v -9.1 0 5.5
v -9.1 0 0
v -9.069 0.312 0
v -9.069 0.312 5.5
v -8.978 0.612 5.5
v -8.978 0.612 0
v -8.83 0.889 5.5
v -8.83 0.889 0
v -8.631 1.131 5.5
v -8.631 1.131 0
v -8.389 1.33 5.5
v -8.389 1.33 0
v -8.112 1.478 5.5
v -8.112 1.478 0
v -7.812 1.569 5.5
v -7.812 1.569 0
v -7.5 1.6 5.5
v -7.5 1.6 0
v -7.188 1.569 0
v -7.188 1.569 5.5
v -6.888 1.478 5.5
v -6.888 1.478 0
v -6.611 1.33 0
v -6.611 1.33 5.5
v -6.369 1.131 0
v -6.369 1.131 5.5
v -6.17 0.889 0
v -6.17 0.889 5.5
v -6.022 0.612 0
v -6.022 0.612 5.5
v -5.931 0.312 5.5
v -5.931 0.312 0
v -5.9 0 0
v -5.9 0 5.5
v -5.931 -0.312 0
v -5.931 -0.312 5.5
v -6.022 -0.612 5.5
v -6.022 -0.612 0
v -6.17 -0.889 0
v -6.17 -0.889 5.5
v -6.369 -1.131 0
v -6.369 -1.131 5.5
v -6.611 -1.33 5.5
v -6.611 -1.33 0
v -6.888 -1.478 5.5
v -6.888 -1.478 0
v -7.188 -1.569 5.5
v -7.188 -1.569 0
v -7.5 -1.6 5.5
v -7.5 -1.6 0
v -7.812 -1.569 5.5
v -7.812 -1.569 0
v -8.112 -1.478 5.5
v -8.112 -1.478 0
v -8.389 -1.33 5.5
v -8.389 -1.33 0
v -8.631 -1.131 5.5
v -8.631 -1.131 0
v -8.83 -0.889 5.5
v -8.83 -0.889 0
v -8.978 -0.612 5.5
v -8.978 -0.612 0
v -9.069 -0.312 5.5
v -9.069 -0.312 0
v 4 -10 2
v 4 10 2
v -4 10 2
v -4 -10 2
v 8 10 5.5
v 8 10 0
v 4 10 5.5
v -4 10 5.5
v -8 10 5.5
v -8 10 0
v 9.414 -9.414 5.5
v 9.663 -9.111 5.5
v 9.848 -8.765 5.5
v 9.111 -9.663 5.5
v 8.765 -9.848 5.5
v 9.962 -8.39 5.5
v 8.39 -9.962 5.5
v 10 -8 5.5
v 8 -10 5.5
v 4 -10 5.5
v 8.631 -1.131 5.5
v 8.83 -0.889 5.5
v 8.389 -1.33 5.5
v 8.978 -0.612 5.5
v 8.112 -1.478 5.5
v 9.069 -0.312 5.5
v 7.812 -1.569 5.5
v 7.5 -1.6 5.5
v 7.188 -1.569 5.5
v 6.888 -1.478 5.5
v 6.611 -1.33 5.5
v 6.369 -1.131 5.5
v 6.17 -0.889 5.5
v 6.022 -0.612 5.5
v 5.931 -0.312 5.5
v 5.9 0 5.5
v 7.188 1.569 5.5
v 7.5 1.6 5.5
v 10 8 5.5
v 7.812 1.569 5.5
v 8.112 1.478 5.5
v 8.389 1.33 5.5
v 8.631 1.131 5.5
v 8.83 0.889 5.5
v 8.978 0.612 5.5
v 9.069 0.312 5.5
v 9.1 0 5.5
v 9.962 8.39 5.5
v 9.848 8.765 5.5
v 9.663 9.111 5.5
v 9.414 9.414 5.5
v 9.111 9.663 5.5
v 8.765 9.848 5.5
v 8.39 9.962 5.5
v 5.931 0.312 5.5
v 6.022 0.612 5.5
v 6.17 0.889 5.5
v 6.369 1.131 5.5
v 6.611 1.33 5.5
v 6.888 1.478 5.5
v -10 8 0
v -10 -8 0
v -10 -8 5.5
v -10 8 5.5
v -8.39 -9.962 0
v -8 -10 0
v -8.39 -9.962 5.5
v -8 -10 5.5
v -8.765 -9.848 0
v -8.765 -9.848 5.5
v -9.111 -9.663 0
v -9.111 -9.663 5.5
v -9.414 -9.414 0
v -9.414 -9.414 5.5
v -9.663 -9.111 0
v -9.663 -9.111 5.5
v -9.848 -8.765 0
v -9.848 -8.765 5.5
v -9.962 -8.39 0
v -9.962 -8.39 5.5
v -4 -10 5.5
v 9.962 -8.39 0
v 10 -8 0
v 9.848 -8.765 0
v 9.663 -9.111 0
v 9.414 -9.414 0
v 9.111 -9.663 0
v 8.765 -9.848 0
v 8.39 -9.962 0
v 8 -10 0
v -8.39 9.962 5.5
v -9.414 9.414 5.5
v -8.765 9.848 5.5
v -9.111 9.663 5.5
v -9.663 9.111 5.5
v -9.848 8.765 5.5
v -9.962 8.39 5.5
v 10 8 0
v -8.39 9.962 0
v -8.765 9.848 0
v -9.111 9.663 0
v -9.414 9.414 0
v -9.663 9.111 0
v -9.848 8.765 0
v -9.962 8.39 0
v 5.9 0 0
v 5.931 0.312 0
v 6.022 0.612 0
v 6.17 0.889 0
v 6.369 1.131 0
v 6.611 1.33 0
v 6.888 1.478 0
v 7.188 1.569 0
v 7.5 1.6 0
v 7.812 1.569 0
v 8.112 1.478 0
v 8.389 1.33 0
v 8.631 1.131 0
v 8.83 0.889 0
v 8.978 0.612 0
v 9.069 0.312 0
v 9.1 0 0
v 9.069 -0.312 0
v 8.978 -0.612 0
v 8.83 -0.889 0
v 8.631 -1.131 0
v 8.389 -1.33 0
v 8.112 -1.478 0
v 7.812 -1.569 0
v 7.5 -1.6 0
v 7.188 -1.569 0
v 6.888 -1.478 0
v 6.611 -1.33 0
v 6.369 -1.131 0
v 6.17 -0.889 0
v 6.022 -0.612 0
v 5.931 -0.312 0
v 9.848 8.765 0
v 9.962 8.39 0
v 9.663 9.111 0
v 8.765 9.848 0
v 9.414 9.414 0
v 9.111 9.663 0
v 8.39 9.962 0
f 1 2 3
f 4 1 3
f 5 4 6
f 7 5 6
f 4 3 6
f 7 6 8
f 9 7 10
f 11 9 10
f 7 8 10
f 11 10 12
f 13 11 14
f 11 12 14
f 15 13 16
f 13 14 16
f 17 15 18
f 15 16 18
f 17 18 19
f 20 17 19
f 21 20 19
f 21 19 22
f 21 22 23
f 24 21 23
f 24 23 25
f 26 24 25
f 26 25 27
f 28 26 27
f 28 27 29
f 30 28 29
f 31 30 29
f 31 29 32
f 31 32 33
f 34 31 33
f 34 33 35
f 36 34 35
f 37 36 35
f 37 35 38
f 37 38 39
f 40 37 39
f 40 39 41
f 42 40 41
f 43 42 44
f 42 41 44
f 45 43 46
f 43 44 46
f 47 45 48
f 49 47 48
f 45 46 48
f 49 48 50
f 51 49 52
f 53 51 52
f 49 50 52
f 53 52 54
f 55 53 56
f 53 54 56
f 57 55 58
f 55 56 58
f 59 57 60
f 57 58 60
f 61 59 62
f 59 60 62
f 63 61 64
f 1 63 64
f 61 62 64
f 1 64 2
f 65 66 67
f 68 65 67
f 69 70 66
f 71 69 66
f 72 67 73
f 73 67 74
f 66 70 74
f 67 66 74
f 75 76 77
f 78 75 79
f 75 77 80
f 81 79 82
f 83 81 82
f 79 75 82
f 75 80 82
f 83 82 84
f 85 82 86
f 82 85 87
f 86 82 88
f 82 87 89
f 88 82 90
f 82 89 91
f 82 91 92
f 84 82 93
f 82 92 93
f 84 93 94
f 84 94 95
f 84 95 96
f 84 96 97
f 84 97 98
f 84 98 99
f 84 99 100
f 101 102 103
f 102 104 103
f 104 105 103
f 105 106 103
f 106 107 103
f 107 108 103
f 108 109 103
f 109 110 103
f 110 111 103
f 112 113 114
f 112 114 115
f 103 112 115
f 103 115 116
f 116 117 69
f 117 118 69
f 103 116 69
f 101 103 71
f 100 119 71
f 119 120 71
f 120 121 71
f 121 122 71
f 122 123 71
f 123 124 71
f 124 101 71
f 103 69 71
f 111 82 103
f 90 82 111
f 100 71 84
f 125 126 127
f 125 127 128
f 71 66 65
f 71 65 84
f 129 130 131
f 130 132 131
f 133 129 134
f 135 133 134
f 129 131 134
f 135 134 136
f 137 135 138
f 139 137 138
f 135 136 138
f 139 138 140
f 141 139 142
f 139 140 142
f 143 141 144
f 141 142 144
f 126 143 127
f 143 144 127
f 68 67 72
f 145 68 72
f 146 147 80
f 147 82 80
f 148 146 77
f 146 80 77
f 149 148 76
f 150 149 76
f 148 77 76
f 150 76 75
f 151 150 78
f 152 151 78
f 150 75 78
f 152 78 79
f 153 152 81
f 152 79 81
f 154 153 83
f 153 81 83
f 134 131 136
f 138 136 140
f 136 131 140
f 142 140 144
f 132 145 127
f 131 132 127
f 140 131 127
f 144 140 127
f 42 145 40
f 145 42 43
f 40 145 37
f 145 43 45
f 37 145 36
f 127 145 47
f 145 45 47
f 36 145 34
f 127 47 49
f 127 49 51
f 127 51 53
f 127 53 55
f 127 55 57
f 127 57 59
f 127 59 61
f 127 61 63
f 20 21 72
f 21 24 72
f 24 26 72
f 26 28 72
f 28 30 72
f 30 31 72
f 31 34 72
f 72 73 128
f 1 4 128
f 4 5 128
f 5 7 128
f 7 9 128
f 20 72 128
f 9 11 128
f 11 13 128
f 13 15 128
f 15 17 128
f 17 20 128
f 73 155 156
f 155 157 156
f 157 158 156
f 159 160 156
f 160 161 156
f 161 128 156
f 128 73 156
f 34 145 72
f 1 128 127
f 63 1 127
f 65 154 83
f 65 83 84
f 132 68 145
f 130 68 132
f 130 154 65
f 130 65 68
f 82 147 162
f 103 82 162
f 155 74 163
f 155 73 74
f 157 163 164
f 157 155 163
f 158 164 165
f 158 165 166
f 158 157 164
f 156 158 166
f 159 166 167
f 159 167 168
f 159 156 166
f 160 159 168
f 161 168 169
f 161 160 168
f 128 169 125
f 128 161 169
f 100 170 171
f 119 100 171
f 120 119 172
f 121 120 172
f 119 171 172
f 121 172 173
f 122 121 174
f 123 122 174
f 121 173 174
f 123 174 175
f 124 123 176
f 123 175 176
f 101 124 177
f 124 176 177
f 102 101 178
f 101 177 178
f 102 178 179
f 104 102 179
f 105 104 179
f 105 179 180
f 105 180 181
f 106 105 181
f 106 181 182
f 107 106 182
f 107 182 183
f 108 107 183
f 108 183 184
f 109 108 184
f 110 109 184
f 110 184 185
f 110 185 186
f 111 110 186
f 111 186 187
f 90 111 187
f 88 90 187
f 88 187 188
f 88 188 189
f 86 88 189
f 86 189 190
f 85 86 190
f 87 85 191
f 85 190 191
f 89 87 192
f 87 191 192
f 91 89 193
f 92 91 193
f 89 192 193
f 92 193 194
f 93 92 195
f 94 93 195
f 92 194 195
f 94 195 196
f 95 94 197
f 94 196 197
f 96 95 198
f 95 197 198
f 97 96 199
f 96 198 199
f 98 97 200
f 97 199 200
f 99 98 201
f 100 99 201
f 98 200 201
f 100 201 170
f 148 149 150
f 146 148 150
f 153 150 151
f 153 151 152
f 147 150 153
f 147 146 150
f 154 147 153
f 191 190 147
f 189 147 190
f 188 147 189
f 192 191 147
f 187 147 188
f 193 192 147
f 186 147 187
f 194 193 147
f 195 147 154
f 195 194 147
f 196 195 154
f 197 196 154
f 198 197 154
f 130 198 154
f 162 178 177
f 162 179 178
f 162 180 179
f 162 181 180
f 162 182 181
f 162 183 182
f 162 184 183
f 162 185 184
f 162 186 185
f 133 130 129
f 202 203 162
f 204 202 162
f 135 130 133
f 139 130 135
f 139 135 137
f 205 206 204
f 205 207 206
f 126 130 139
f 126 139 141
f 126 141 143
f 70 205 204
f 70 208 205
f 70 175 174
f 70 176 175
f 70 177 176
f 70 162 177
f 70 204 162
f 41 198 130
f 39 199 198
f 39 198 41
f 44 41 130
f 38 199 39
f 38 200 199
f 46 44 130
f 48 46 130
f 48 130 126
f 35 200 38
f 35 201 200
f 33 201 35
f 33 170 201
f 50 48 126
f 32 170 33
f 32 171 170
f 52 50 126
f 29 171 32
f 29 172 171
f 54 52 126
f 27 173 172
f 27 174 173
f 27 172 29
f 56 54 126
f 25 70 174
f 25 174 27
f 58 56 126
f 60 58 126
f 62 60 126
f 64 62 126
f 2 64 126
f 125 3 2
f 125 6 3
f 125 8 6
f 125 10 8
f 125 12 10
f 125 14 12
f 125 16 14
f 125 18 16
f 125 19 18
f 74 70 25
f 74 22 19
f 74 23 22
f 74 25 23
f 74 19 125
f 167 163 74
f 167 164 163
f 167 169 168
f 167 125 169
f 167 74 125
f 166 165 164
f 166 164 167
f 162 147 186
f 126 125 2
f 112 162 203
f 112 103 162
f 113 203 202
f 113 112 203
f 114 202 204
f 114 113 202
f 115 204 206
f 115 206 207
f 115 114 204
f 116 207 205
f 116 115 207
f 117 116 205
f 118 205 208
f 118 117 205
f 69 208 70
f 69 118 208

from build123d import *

# Parameters (mm, degrees)
SKETCH1_W           = 20
SKETCH1_H           = 20
BOSS_EXTRUDE1_DEPTH = 5.5
SKETCH2_W           = 8
SKETCH2_H           = 3.5
CUT_EXTRUDE1_DEPTH  = 24.027157879
HOLEWZD1_D          = 3.2
FILLET1_R           = 2


with BuildPart() as part:
    # Sketch1 → Boss-Extrude1 (new body)
    with BuildSketch(Plane(origin=(0, 0, 0), x_dir=(-1, 0, 0), z_dir=(0, 0, -1))):
        Rectangle(SKETCH1_W, SKETCH1_H)
    extrude(amount=-BOSS_EXTRUDE1_DEPTH)

    # Sketch2 → Cut-Extrude1 (cut, through all)
    with BuildSketch(Plane(origin=(0, 10, 0), x_dir=(-1, 0, 0), z_dir=(0, 1, 0))):
        with Locations((0, 3.75)):
            Rectangle(SKETCH2_W, SKETCH2_H)
    extrude(amount=-CUT_EXTRUDE1_DEPTH, mode=Mode.SUBTRACT)

    # HoleWzd1 (through all)
    with Locations(Plane.XY.offset(5.5)):
        with Locations((7.5, 0), (-7.5, 0)):
            Hole(HOLEWZD1_D / 2)

    # Fillet1
    fillet1_edges = [part.edges().sort_by_distance(p)[0] for p in [
        (-10, -10, 2.75),
        (10, -10, 2.75),
        (10, 10, 2.75),
        (-10, 10, 2.75),
    ]]
    fillet(fillet1_edges, radius=FILLET1_R)


solid = part.part
